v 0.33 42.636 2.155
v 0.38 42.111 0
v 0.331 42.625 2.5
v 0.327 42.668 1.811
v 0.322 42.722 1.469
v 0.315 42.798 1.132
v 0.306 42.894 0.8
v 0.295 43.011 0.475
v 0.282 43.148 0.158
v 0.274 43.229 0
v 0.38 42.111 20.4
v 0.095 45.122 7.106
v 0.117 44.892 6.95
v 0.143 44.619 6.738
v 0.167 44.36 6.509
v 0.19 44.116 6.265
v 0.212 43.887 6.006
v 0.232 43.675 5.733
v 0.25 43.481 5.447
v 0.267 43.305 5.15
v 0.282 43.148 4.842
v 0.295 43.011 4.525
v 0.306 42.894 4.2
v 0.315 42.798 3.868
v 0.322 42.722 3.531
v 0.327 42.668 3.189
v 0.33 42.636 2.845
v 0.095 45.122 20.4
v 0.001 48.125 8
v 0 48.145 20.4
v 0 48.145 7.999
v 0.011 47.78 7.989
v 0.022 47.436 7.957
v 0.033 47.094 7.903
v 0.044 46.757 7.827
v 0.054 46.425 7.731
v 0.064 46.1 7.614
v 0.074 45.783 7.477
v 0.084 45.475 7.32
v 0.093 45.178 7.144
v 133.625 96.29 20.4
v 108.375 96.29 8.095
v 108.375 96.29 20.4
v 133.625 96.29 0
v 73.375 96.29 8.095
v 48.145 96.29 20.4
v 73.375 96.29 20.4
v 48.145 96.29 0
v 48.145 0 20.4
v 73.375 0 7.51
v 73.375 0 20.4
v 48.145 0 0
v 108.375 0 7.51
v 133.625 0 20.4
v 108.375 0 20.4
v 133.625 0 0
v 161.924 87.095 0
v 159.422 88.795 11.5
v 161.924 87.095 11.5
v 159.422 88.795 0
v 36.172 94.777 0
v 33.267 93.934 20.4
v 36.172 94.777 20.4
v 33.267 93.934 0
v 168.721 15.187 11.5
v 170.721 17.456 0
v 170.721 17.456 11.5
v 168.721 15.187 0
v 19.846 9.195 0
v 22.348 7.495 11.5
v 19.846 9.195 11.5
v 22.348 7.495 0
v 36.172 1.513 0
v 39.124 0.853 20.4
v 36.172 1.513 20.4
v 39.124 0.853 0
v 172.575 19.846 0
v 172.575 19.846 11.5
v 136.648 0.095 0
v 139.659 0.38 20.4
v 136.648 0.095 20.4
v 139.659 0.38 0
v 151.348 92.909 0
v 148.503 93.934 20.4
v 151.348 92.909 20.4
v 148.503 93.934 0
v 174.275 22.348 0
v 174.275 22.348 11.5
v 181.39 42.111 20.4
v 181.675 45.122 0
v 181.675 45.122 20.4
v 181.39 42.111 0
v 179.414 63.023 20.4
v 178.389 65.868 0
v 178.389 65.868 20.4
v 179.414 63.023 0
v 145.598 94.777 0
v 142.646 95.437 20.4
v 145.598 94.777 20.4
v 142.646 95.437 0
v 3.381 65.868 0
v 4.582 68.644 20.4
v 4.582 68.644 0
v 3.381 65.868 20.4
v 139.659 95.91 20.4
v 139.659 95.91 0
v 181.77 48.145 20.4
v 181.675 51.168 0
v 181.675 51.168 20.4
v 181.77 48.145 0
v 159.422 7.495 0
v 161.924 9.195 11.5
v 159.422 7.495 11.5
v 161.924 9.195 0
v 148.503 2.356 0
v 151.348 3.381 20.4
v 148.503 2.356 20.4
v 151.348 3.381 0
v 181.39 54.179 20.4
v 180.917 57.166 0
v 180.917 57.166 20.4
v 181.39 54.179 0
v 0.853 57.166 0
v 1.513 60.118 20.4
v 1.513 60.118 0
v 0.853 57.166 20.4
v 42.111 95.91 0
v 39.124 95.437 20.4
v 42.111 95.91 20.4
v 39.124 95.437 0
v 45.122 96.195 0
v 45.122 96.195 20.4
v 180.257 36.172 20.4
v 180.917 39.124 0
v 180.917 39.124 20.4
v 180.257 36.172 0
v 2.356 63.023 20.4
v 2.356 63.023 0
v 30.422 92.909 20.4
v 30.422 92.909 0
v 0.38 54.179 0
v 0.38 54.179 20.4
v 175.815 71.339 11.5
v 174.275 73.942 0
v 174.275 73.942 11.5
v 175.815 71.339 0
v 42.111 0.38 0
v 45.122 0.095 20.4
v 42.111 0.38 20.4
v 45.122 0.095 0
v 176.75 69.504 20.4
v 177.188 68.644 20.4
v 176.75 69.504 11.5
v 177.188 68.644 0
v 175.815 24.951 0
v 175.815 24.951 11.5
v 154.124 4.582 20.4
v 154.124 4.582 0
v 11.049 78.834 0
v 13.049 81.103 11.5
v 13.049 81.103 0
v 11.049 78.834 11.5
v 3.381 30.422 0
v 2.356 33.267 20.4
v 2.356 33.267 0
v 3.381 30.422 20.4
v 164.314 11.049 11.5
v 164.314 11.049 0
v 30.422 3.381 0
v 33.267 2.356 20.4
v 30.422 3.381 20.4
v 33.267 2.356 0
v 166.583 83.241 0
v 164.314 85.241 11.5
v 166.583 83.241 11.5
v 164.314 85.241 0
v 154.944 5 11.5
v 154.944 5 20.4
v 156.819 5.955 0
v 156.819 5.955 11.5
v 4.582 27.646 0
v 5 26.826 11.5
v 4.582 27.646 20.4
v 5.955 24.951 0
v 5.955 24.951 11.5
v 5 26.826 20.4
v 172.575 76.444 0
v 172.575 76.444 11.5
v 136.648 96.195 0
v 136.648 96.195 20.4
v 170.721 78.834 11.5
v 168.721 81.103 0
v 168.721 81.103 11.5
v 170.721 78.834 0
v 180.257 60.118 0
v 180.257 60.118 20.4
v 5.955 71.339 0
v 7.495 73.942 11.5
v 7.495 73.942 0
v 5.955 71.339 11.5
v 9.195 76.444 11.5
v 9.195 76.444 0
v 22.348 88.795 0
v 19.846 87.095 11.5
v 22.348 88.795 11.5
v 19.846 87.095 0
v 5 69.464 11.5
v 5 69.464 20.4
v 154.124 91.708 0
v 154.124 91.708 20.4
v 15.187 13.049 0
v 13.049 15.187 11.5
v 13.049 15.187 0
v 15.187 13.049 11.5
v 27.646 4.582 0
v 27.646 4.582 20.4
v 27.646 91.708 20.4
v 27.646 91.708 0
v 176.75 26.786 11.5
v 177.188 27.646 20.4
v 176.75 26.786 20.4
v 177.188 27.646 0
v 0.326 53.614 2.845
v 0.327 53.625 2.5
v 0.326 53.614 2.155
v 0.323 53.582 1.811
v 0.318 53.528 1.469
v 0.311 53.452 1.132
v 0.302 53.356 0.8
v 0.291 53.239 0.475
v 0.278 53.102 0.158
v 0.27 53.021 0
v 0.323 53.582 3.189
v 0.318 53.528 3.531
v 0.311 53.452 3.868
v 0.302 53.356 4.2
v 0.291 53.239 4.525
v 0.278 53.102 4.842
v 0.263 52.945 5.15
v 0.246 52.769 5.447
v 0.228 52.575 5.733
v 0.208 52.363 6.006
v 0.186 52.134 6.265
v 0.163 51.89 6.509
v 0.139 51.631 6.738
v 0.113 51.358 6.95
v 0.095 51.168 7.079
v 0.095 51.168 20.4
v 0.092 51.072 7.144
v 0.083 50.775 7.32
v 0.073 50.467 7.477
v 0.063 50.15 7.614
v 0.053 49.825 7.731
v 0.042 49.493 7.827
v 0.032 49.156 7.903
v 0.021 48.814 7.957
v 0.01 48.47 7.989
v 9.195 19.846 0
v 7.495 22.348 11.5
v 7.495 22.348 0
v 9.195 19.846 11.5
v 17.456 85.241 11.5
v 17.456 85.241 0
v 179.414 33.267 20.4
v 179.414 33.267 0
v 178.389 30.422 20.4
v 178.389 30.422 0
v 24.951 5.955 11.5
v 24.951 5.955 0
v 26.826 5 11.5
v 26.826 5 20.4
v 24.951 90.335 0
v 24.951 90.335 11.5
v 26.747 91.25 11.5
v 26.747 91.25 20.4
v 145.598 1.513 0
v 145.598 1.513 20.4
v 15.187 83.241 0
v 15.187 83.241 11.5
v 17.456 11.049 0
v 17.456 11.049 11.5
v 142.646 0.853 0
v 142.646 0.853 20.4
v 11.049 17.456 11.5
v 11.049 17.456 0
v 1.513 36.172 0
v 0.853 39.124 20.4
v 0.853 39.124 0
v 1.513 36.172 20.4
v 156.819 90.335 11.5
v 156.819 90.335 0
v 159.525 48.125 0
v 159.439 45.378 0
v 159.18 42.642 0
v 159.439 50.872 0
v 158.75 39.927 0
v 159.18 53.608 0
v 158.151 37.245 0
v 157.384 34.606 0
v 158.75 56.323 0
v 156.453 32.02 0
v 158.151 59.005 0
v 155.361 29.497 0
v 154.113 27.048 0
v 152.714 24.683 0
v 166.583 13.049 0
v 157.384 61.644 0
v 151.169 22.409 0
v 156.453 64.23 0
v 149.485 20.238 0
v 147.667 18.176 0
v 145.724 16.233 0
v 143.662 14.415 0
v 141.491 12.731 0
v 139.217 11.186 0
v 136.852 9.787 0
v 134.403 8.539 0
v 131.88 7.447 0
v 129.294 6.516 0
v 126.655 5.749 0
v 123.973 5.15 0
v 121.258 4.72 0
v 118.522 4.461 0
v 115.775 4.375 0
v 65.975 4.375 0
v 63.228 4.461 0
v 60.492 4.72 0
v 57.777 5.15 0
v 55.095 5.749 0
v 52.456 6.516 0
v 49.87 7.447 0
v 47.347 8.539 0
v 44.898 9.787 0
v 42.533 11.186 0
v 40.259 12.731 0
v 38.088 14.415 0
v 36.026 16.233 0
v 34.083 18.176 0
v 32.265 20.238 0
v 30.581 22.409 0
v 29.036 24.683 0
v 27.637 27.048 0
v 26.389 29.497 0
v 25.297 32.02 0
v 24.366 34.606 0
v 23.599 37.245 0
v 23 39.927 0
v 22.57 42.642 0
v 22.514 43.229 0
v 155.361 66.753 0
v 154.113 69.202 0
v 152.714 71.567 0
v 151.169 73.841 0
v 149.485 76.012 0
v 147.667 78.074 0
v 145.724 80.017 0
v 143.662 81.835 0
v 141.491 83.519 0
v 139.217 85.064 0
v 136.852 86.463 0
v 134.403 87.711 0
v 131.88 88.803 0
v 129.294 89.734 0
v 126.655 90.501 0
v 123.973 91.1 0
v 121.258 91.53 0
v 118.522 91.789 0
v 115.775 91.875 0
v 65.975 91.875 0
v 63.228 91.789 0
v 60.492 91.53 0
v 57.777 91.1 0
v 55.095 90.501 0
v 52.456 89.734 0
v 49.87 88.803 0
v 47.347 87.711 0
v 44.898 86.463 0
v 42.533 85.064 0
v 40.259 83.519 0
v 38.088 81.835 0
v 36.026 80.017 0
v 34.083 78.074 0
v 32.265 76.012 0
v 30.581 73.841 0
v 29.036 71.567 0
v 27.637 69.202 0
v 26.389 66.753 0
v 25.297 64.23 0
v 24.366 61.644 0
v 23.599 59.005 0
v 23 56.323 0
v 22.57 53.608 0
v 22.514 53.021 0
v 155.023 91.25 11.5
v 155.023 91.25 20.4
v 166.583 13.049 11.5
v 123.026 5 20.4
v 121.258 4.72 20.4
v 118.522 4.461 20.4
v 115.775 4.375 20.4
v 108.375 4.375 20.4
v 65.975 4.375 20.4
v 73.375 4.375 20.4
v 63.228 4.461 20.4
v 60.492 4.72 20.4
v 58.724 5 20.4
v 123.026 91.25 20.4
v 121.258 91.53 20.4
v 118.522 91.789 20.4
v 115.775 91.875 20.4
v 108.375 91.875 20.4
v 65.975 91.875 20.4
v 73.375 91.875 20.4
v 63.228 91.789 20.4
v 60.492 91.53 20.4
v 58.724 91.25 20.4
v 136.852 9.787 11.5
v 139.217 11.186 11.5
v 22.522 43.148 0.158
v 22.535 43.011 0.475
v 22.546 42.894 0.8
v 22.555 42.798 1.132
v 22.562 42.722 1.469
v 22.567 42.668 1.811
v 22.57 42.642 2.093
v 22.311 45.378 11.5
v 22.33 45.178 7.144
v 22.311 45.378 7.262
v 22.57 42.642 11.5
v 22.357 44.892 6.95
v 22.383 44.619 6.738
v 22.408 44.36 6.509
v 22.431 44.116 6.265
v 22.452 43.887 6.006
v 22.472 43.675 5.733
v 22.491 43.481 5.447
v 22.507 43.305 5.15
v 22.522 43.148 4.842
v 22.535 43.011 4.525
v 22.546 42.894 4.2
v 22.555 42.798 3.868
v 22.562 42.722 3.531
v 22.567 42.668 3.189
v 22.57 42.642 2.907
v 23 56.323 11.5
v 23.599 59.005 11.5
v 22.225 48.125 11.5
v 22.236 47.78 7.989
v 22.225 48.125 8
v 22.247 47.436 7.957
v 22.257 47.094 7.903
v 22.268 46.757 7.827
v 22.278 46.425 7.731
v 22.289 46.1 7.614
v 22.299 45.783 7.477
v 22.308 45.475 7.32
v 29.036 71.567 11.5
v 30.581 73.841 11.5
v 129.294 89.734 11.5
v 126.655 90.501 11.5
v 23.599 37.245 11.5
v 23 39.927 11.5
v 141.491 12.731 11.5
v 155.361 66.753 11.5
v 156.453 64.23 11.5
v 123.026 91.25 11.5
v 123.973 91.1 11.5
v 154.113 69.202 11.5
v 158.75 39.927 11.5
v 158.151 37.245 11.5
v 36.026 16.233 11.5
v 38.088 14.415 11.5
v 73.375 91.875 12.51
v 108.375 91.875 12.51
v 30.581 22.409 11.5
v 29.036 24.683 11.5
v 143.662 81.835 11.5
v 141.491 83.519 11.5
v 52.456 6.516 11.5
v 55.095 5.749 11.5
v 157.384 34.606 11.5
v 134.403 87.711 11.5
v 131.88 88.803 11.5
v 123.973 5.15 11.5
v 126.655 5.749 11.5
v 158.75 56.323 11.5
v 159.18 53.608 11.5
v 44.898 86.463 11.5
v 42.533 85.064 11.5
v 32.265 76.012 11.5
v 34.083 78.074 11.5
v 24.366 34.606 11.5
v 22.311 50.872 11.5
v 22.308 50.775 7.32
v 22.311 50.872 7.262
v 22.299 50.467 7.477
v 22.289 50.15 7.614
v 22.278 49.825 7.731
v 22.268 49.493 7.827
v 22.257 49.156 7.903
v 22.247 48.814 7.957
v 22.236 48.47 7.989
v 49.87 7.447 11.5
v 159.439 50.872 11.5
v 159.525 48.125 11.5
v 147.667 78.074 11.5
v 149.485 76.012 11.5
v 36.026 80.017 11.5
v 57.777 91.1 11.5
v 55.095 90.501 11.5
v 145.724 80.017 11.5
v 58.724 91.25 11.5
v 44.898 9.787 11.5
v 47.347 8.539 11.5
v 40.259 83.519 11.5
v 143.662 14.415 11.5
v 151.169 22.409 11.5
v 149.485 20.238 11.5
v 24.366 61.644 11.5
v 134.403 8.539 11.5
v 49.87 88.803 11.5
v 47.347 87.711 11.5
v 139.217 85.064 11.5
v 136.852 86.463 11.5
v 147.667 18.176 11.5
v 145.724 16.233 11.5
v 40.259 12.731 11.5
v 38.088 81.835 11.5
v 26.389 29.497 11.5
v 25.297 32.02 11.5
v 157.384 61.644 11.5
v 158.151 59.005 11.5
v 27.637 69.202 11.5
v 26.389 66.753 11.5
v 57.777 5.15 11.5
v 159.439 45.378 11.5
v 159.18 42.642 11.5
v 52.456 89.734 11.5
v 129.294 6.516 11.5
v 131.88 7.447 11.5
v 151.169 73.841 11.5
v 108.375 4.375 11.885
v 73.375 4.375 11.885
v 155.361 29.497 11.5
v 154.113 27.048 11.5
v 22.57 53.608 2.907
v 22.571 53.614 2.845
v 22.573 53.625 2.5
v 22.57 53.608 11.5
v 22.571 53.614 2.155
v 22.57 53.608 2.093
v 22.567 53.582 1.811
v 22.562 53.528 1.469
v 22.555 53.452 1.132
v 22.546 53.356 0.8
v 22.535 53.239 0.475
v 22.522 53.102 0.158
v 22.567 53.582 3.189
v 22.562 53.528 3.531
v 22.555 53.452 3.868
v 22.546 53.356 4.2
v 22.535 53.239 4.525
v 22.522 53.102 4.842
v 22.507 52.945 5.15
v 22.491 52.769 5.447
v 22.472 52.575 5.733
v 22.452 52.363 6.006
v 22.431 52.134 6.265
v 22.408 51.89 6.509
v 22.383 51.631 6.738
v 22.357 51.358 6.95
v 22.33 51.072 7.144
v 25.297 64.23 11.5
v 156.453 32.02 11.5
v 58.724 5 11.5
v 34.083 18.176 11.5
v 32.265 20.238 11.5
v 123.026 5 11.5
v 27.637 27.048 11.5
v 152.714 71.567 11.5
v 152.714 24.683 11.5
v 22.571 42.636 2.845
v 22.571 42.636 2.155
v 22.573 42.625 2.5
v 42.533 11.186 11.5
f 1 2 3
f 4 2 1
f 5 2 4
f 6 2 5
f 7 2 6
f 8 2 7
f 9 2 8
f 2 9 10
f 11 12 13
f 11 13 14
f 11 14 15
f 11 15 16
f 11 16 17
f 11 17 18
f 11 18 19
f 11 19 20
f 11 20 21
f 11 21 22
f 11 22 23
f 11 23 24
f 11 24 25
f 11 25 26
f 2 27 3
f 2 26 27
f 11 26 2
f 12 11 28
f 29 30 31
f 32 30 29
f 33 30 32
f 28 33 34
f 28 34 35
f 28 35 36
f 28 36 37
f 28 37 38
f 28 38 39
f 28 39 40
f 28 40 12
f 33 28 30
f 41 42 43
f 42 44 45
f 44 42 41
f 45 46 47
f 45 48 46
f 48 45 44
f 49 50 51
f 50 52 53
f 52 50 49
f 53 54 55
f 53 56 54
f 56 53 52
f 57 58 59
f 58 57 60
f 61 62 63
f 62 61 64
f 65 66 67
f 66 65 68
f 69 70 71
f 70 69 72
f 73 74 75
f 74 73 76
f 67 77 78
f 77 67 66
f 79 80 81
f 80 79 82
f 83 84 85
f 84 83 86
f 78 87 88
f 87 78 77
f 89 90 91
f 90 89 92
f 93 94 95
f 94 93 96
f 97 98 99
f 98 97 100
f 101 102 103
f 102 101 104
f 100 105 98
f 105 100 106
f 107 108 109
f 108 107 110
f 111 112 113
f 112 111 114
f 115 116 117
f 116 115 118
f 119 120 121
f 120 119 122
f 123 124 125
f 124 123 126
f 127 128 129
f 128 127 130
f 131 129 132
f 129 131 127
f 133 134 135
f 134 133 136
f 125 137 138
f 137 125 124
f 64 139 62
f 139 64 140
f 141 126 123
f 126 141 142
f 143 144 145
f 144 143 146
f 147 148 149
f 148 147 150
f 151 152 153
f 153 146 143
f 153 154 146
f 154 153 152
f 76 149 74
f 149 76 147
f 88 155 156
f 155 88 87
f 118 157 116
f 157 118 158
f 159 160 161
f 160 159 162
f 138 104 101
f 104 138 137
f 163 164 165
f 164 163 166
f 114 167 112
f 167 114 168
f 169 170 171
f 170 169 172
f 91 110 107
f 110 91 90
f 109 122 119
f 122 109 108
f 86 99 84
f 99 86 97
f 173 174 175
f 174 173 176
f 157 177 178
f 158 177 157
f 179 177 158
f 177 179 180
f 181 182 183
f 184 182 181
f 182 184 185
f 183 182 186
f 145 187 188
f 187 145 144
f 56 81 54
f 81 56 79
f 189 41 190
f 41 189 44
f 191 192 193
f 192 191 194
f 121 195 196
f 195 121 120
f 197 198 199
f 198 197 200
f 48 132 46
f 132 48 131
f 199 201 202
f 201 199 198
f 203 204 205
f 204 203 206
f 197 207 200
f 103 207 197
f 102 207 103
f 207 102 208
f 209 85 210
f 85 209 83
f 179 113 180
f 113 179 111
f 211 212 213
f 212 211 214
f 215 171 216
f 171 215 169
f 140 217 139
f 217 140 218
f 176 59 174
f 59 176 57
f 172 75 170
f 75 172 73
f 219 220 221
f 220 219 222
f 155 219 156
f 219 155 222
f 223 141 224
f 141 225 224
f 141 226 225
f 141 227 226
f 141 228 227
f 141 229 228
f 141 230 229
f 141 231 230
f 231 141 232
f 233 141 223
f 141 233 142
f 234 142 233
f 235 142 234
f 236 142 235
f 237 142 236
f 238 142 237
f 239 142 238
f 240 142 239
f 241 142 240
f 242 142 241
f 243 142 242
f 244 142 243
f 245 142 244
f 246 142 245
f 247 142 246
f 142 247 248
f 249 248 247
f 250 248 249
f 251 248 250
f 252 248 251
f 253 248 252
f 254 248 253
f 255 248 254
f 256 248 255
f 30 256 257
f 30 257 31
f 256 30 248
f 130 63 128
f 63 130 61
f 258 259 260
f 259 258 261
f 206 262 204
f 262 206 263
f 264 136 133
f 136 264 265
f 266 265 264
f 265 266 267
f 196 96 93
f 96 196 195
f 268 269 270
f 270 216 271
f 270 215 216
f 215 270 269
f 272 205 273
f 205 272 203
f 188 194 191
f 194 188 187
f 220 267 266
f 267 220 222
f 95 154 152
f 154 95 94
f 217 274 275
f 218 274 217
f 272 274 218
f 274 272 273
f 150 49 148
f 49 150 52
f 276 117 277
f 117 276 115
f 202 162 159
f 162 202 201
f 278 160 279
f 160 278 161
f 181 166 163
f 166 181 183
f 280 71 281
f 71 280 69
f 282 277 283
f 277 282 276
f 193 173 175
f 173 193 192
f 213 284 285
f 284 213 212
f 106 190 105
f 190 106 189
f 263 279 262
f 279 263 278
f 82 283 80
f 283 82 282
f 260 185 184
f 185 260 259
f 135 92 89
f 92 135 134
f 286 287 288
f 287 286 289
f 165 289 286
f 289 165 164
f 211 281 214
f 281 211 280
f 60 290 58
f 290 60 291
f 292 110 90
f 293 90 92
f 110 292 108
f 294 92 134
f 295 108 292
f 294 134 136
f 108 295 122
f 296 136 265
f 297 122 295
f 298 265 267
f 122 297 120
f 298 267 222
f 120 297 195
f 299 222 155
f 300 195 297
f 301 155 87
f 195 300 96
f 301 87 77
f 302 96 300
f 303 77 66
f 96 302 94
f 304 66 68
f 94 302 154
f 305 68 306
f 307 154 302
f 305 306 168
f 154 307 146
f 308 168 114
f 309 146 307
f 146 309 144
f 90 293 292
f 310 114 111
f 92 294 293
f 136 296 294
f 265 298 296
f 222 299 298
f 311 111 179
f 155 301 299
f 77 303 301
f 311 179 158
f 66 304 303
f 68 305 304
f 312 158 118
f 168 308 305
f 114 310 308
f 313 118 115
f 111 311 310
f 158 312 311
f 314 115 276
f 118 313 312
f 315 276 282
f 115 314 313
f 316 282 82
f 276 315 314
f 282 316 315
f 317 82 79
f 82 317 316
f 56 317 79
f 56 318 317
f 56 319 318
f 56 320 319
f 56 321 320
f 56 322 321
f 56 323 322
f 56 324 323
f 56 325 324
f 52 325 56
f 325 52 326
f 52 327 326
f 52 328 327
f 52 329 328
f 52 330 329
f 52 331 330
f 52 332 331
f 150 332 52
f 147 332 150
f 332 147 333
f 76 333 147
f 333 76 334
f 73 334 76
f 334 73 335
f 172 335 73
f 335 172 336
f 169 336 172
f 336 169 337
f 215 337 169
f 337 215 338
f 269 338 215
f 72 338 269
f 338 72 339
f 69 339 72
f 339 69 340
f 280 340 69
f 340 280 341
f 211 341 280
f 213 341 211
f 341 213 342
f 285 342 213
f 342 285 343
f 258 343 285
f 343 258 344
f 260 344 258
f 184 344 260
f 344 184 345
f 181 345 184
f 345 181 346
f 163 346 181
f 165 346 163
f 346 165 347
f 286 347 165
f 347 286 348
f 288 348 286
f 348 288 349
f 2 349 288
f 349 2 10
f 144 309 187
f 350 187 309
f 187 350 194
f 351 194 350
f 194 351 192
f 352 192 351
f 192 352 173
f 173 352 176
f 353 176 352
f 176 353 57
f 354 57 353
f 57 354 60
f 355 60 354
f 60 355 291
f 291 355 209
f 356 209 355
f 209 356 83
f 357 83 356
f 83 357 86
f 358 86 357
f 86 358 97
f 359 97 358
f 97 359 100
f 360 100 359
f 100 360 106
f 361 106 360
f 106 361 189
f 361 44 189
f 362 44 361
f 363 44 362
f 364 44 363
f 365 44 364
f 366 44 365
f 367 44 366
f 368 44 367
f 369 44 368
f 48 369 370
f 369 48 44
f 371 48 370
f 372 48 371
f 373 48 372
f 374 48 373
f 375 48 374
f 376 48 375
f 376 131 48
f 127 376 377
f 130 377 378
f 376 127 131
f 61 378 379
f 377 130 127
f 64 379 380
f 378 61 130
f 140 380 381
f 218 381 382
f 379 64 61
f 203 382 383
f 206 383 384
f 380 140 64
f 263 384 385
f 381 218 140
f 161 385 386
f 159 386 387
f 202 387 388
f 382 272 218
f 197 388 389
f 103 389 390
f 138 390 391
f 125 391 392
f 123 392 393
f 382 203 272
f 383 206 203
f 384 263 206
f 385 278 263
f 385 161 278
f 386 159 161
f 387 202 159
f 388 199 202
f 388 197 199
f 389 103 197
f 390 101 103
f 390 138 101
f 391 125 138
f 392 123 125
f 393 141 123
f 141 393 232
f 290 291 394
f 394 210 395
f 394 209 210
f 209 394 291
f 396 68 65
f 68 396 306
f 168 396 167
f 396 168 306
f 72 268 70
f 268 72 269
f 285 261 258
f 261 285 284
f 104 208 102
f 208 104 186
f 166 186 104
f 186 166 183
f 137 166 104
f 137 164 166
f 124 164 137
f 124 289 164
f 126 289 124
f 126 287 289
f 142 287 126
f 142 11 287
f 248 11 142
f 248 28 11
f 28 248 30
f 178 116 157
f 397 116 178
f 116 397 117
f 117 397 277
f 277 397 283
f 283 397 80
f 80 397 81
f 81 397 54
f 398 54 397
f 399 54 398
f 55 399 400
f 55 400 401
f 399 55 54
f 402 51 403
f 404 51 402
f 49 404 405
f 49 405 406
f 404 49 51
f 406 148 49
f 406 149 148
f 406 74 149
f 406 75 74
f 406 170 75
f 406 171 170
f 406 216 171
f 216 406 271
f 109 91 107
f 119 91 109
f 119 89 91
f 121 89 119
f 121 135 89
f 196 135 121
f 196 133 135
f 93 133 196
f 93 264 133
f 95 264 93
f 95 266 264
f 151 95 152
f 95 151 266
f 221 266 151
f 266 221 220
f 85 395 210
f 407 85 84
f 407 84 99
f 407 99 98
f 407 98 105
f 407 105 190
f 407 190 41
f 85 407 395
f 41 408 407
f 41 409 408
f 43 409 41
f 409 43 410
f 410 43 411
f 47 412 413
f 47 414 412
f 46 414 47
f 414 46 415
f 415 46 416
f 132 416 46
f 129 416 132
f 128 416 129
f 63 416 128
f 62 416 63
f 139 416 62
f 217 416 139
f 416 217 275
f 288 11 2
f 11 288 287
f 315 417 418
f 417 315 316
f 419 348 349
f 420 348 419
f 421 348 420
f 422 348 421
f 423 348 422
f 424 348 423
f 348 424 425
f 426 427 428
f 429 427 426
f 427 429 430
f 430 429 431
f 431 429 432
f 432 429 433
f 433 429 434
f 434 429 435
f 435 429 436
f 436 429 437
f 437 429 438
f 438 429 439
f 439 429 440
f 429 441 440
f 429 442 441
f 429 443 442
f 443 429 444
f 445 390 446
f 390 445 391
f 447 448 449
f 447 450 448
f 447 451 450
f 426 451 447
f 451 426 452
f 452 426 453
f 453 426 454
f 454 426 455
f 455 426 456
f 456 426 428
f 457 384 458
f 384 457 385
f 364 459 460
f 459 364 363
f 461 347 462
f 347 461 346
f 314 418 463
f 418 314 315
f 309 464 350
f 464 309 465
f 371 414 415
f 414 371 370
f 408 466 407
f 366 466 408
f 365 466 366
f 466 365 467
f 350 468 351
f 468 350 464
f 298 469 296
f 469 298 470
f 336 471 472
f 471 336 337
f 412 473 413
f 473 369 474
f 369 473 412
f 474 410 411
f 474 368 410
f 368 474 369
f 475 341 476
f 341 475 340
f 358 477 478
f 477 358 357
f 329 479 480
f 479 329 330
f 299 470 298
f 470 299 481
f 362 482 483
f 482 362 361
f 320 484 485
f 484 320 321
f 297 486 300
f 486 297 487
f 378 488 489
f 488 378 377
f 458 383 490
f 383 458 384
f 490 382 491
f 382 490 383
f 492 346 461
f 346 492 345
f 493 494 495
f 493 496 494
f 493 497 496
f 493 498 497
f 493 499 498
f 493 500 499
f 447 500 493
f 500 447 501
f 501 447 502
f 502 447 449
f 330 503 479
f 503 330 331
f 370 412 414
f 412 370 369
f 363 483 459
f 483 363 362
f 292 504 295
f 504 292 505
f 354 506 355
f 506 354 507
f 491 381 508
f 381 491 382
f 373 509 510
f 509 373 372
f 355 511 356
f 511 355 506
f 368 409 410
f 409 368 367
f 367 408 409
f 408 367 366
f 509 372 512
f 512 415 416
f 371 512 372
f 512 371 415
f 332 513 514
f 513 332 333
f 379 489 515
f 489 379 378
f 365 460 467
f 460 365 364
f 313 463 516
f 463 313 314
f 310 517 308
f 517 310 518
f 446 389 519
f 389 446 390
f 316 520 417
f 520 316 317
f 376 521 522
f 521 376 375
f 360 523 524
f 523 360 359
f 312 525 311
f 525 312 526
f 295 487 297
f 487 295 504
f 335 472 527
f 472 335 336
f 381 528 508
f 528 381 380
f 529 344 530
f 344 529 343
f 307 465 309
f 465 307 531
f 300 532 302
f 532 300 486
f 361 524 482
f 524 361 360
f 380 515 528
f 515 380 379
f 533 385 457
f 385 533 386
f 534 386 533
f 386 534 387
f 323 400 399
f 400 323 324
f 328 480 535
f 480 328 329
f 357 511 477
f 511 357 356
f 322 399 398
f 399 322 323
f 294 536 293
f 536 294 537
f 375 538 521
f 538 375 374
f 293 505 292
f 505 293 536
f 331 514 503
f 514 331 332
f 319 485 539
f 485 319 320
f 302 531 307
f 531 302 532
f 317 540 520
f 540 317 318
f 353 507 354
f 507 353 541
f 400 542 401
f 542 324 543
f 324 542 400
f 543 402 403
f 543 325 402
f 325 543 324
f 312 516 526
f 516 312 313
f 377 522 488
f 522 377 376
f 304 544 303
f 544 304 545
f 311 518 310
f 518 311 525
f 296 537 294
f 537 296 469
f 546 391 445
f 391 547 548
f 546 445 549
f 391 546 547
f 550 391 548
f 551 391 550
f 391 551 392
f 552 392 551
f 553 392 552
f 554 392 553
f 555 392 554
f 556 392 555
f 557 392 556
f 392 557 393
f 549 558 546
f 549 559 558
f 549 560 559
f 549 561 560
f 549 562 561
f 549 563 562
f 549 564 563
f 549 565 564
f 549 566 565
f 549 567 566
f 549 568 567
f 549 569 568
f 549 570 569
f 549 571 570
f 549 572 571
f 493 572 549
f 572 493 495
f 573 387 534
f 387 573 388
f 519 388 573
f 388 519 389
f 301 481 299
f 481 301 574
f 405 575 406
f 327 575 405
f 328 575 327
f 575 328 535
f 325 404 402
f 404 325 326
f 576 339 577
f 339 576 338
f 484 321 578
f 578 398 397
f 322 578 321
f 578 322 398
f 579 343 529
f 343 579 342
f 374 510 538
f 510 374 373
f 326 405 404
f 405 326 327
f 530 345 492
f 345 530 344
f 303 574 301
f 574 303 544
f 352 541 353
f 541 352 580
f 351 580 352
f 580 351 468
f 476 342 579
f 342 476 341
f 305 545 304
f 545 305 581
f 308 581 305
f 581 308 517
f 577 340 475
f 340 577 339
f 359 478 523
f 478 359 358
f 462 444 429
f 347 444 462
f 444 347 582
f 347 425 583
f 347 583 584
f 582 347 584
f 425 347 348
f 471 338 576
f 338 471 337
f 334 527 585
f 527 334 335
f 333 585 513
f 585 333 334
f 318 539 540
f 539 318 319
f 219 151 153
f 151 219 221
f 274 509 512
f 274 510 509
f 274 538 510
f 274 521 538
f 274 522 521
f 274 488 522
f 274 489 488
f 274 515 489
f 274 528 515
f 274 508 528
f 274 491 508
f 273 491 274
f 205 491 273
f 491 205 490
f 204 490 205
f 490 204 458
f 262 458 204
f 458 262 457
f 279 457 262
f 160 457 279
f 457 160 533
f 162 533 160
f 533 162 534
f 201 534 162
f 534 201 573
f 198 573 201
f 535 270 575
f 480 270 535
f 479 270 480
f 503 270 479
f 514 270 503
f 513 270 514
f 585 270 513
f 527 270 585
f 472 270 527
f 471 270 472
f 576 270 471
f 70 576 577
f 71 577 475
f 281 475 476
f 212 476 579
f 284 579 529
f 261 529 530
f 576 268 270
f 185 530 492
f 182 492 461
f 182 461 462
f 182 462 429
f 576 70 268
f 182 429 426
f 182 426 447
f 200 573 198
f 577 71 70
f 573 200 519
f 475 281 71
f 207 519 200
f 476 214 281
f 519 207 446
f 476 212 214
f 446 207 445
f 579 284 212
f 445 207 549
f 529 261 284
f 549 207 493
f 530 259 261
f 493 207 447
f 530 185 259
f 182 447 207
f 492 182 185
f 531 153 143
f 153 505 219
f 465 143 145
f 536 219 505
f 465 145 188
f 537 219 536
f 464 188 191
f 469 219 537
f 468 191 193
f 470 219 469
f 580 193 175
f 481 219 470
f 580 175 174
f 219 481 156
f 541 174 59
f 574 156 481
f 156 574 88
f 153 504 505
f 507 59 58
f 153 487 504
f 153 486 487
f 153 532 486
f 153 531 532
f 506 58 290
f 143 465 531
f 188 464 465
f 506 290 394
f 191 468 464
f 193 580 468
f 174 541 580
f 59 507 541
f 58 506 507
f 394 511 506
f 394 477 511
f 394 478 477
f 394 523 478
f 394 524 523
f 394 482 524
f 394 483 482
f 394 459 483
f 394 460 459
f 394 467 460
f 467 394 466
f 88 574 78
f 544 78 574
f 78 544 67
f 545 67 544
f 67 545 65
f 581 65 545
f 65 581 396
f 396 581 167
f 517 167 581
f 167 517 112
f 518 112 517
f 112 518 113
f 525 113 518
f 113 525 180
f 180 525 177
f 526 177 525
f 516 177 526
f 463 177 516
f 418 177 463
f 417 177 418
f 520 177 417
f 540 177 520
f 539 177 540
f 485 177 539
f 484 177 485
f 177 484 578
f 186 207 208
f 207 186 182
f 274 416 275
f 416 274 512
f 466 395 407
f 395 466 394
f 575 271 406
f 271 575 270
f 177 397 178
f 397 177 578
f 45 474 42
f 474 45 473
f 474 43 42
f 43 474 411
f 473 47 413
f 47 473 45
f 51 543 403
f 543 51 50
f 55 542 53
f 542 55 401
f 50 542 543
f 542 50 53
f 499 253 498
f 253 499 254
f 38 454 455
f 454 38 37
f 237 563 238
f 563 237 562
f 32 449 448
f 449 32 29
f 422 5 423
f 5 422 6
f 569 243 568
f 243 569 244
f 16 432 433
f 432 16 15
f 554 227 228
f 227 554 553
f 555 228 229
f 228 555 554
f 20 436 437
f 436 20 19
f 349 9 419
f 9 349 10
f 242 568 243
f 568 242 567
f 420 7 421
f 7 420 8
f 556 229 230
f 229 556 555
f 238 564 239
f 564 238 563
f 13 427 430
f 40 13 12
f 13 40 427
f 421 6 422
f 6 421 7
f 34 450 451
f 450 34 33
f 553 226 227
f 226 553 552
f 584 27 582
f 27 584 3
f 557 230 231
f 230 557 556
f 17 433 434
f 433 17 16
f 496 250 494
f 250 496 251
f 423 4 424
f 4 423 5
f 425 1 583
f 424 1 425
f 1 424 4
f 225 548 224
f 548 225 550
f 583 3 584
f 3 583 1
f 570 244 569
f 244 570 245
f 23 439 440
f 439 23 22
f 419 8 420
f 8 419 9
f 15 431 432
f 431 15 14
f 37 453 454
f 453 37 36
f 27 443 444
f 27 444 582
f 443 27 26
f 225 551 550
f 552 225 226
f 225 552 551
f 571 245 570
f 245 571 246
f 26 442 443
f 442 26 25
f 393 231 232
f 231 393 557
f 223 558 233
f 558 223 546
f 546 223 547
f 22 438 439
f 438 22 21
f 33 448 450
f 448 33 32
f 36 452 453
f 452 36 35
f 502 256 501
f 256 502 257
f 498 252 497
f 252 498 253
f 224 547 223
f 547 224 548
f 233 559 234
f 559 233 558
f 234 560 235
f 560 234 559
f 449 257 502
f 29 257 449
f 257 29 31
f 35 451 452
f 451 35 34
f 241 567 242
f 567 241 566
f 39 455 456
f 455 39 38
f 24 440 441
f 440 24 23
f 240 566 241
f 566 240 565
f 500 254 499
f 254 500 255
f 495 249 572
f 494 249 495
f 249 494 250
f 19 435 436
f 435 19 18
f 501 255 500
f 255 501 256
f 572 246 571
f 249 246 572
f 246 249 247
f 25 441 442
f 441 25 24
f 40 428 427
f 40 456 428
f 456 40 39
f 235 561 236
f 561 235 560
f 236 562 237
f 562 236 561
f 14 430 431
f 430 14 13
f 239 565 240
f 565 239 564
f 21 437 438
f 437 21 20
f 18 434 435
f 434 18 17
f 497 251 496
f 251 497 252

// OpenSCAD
$fn = 100;

// Charger measurements
cRadius = 43.75;       //charger circle radius
cThickness = 11.5;     //charger thickness
cCenterXDist = 49.8;   //distence between charger circle centers

// Phone measurements
pThickness = 13.35;    //phone thickness
pLength = 171.75;      //phone length
pWidth = 86.25;        //phone width

// Alignment values for charger translation
cLength = cRadius * 2 + cCenterXDist;
cWidth = cRadius * 2;
xAlign = cRadius + (pLength-cLength) / 2 + 5;
yAlign = cRadius + (pWidth+10-cWidth) / 2;

module Charger(xt, yt, zt){
  translate([xt, yt, zt]) 
    color("black") 
    linear_extrude(height = cThickness+pThickness) {
      hull() {
        circle(cRadius);
        translate([cCenterXDist, 0, 0])
          circle(cRadius);
      }
    }
}

module Phone(xt, yt, zt){
  translate([xt, yt, zt])
    color("blue")
    cube([pLength, pWidth, pThickness]);
}

module Holder(xt, yt, zt){
  r = pWidth/2 + 5.02;
  color("green")
    linear_extrude(pThickness+cThickness-(pThickness/3))
      translate([r, r, 0])
      hull(){
        circle(r);
        translate([pLength - r*2 + 10.02, 0, 0])
          circle(r);
      }
}

module Slopes(xt, yt, zt, rot){
  translate([xt, yt, zt])
    rotate([90, 0, rot])
    linear_extrude(35)
    polygon([[0,0],
             [5.02,5.02],
             [5.02,pThickness + 0.02],
             [0,pThickness + 0.02]]);
}


module SlopeTop(xt, yt, zt){
  color("red")
    translate([xt, yt, zt])
    Slopes(35, 5.01, 0, -90);
}

module SlopeBottom(xt, yt, zt){
  translate([xt, yt, zt])
  Slopes(0, -0.01, 0, 90);
}

module CordSlot(xt, yt, zt){
  translate([xt, yt, zt])
    rotate([0, 90, 0])
    cylinder(h=30, r=5.5, center=false);
}


difference() {
  Holder(0, 0, 0);
  Charger(xAlign, yAlign, -0.01);
  Phone(5, 5, cThickness);
  SlopeTop(xAlign + cCenterXDist/2 - 17.5,
           yAlign + cRadius,
           cThickness - 4);
  SlopeBottom(xAlign + cCenterXDist/2 - 17.5,
              0,
              cThickness - 4);
  CordSlot(-0.01, (pWidth+10)/2, 2.5);
}
